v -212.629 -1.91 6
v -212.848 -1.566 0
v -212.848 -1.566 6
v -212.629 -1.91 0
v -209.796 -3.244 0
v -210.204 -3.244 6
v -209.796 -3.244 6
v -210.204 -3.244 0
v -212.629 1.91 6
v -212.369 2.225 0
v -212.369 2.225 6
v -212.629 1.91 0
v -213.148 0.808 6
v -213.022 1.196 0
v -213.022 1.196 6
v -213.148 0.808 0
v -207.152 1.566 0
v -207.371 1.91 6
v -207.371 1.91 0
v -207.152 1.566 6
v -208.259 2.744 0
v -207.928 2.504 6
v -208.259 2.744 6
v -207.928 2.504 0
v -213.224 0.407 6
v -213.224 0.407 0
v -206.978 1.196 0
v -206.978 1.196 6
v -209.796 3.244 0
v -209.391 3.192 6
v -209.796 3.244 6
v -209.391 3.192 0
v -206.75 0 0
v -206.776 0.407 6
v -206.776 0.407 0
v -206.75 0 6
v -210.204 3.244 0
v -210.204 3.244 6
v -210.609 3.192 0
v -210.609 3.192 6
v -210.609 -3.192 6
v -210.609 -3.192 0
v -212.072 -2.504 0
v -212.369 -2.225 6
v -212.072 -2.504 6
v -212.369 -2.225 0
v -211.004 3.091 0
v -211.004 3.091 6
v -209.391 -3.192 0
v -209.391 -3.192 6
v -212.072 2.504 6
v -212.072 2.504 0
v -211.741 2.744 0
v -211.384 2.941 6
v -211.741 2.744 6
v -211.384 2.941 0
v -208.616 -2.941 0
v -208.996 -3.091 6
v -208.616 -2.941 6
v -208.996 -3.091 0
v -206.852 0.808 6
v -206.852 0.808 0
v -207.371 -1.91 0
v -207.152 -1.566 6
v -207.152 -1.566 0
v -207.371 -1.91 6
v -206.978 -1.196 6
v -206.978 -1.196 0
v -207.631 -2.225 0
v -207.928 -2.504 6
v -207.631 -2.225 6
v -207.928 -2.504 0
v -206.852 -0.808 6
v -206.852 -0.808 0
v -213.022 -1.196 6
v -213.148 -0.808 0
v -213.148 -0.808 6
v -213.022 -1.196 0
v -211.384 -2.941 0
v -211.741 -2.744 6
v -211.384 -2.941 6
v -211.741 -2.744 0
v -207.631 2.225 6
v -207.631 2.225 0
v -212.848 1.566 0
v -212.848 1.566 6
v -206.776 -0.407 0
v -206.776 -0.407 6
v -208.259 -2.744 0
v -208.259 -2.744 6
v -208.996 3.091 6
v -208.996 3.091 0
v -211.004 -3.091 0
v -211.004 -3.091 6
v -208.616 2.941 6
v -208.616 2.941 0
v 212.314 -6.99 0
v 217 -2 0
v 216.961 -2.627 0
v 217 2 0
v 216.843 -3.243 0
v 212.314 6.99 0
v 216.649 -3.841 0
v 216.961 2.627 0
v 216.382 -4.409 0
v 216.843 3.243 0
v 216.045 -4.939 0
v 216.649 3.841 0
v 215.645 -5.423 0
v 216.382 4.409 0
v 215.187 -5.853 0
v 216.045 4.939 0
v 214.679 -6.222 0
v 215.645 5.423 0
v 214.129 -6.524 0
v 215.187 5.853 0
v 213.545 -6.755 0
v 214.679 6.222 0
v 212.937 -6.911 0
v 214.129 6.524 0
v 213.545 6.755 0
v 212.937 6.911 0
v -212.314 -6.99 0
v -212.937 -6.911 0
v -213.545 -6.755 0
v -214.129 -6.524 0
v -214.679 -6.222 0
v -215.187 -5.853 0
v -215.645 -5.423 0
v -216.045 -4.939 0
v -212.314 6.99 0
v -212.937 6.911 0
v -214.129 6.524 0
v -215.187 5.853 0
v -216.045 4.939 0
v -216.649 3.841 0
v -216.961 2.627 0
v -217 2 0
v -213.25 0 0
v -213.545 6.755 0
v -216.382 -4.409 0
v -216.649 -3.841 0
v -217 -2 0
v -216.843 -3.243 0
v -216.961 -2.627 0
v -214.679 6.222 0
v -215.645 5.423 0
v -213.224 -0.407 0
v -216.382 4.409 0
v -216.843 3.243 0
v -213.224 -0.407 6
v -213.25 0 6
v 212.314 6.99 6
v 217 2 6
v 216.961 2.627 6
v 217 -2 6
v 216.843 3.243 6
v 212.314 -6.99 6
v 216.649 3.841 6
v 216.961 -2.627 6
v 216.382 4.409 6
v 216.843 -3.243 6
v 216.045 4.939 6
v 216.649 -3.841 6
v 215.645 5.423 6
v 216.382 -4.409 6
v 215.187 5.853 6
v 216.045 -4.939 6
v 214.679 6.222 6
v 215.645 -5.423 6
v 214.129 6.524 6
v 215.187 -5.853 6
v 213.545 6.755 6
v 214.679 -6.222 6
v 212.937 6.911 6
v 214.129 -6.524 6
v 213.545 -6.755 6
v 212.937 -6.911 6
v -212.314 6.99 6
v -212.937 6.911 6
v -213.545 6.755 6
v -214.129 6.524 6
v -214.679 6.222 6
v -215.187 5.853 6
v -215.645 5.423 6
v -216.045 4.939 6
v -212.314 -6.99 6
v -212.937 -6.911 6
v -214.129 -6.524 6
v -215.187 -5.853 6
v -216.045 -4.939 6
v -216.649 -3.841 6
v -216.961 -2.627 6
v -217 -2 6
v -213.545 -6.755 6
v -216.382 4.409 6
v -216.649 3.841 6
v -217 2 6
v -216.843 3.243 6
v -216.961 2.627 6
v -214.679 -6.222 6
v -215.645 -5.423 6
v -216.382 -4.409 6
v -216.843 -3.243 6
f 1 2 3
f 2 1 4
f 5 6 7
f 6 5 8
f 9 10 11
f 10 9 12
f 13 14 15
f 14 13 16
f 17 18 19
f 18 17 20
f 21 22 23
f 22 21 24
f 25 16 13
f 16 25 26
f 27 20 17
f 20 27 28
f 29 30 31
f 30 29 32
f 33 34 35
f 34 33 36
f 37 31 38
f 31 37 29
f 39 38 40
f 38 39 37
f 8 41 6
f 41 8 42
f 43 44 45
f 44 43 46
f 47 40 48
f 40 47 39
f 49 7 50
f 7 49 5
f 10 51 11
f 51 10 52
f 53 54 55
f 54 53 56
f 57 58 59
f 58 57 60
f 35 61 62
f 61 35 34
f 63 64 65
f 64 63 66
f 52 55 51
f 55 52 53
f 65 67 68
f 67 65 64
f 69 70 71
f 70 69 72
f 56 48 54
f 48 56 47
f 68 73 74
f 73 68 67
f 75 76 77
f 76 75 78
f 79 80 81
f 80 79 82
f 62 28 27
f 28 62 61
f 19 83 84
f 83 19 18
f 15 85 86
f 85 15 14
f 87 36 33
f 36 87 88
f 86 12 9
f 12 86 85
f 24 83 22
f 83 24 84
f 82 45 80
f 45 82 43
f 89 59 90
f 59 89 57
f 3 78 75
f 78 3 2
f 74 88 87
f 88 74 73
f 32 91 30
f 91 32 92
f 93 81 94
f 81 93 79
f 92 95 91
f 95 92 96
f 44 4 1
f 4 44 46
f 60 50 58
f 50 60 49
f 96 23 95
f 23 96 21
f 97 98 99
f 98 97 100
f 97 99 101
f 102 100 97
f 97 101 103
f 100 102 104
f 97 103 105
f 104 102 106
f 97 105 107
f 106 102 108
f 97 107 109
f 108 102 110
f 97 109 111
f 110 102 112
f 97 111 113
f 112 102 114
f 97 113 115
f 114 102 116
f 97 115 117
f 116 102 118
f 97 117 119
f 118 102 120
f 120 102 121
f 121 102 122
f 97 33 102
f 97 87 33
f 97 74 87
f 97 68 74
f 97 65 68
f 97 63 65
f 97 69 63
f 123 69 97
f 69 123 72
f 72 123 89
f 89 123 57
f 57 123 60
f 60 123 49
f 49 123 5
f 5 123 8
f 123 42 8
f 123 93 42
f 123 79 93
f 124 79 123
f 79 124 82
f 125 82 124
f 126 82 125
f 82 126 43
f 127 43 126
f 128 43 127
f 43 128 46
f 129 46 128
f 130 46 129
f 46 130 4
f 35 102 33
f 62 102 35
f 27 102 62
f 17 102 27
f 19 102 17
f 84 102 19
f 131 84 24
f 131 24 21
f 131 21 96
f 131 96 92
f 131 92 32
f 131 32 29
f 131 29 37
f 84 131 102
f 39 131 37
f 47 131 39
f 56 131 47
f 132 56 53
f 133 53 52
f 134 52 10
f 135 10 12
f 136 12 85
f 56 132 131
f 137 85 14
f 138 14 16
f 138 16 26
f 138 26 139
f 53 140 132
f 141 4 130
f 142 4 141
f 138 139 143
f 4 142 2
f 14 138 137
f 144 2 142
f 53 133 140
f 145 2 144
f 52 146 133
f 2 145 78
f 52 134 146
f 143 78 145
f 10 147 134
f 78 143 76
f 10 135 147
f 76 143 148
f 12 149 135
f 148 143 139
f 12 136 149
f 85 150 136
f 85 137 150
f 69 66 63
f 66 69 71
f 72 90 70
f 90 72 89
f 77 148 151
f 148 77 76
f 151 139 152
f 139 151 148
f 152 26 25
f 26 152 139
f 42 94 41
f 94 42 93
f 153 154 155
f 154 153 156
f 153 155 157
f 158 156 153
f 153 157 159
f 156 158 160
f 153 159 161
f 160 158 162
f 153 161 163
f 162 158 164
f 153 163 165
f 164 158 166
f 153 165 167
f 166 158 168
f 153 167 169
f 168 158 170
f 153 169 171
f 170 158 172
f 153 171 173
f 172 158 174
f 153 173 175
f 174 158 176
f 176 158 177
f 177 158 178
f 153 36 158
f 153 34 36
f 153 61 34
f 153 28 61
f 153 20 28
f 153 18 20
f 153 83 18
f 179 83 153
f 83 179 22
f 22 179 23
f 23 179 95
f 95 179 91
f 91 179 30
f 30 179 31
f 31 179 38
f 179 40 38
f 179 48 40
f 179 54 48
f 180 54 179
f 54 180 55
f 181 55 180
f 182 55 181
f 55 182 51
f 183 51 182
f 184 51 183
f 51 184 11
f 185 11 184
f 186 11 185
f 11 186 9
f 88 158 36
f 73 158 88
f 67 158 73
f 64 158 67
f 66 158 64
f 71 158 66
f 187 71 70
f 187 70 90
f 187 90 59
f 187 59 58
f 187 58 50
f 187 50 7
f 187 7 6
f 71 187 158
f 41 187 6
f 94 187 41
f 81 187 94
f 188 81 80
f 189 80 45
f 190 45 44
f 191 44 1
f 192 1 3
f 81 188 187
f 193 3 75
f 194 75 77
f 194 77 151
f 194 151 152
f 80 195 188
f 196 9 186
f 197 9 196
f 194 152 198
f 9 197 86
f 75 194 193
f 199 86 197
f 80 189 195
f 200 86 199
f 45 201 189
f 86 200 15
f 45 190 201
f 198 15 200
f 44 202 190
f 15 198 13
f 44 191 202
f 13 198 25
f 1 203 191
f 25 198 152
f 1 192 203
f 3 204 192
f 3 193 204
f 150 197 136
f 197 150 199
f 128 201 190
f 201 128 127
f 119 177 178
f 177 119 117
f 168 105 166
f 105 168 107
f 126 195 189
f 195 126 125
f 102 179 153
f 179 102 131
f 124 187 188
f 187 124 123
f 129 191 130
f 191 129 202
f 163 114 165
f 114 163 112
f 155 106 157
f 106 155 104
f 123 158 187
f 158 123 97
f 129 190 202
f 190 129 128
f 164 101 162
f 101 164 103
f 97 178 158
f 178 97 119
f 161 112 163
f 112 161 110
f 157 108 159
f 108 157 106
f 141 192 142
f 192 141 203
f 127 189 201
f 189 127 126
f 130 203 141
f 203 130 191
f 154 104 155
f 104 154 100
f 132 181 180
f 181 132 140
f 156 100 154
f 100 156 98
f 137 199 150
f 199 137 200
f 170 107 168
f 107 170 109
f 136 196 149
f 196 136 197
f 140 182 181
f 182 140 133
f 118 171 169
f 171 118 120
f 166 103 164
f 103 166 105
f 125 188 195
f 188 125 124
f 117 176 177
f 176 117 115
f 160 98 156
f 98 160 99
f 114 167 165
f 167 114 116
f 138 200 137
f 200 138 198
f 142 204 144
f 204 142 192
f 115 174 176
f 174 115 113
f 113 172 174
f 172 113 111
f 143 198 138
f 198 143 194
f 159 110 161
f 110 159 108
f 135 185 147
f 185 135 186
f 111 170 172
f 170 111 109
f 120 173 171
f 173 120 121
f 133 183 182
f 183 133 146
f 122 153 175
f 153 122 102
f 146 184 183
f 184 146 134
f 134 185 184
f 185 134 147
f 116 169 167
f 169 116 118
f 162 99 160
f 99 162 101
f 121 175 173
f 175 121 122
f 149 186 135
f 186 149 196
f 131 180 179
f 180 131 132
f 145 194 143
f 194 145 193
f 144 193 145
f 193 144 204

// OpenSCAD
$fn = 50;


difference() {
	union() {
		hull() {
			translate(v = [-212.0000000000, 2.0000000000, 0]) {
				cylinder(h = 6, r = 5);
			}
			translate(v = [212.0000000000, 2.0000000000, 0]) {
				cylinder(h = 6, r = 5);
			}
			translate(v = [-212.0000000000, -2.0000000000, 0]) {
				cylinder(h = 6, r = 5);
			}
			translate(v = [212.0000000000, -2.0000000000, 0]) {
				cylinder(h = 6, r = 5);
			}
		}
	}
	union() {
		translate(v = [-210.0000000000, 0.0000000000, 0]) {
			cylinder(h = 6, r = 3.2500000000);
		}
		translate(v = [-210.0000000000, 0.0000000000, 0]) {
			cylinder(h = 6, r = 1.8000000000);
		}
		translate(v = [-210.0000000000, 0.0000000000, 0]) {
			cylinder(h = 6, r = 1.8000000000);
		}
		translate(v = [-210.0000000000, 0.0000000000, 0]) {
			cylinder(h = 6, r = 1.8000000000);
		}
	}
}
